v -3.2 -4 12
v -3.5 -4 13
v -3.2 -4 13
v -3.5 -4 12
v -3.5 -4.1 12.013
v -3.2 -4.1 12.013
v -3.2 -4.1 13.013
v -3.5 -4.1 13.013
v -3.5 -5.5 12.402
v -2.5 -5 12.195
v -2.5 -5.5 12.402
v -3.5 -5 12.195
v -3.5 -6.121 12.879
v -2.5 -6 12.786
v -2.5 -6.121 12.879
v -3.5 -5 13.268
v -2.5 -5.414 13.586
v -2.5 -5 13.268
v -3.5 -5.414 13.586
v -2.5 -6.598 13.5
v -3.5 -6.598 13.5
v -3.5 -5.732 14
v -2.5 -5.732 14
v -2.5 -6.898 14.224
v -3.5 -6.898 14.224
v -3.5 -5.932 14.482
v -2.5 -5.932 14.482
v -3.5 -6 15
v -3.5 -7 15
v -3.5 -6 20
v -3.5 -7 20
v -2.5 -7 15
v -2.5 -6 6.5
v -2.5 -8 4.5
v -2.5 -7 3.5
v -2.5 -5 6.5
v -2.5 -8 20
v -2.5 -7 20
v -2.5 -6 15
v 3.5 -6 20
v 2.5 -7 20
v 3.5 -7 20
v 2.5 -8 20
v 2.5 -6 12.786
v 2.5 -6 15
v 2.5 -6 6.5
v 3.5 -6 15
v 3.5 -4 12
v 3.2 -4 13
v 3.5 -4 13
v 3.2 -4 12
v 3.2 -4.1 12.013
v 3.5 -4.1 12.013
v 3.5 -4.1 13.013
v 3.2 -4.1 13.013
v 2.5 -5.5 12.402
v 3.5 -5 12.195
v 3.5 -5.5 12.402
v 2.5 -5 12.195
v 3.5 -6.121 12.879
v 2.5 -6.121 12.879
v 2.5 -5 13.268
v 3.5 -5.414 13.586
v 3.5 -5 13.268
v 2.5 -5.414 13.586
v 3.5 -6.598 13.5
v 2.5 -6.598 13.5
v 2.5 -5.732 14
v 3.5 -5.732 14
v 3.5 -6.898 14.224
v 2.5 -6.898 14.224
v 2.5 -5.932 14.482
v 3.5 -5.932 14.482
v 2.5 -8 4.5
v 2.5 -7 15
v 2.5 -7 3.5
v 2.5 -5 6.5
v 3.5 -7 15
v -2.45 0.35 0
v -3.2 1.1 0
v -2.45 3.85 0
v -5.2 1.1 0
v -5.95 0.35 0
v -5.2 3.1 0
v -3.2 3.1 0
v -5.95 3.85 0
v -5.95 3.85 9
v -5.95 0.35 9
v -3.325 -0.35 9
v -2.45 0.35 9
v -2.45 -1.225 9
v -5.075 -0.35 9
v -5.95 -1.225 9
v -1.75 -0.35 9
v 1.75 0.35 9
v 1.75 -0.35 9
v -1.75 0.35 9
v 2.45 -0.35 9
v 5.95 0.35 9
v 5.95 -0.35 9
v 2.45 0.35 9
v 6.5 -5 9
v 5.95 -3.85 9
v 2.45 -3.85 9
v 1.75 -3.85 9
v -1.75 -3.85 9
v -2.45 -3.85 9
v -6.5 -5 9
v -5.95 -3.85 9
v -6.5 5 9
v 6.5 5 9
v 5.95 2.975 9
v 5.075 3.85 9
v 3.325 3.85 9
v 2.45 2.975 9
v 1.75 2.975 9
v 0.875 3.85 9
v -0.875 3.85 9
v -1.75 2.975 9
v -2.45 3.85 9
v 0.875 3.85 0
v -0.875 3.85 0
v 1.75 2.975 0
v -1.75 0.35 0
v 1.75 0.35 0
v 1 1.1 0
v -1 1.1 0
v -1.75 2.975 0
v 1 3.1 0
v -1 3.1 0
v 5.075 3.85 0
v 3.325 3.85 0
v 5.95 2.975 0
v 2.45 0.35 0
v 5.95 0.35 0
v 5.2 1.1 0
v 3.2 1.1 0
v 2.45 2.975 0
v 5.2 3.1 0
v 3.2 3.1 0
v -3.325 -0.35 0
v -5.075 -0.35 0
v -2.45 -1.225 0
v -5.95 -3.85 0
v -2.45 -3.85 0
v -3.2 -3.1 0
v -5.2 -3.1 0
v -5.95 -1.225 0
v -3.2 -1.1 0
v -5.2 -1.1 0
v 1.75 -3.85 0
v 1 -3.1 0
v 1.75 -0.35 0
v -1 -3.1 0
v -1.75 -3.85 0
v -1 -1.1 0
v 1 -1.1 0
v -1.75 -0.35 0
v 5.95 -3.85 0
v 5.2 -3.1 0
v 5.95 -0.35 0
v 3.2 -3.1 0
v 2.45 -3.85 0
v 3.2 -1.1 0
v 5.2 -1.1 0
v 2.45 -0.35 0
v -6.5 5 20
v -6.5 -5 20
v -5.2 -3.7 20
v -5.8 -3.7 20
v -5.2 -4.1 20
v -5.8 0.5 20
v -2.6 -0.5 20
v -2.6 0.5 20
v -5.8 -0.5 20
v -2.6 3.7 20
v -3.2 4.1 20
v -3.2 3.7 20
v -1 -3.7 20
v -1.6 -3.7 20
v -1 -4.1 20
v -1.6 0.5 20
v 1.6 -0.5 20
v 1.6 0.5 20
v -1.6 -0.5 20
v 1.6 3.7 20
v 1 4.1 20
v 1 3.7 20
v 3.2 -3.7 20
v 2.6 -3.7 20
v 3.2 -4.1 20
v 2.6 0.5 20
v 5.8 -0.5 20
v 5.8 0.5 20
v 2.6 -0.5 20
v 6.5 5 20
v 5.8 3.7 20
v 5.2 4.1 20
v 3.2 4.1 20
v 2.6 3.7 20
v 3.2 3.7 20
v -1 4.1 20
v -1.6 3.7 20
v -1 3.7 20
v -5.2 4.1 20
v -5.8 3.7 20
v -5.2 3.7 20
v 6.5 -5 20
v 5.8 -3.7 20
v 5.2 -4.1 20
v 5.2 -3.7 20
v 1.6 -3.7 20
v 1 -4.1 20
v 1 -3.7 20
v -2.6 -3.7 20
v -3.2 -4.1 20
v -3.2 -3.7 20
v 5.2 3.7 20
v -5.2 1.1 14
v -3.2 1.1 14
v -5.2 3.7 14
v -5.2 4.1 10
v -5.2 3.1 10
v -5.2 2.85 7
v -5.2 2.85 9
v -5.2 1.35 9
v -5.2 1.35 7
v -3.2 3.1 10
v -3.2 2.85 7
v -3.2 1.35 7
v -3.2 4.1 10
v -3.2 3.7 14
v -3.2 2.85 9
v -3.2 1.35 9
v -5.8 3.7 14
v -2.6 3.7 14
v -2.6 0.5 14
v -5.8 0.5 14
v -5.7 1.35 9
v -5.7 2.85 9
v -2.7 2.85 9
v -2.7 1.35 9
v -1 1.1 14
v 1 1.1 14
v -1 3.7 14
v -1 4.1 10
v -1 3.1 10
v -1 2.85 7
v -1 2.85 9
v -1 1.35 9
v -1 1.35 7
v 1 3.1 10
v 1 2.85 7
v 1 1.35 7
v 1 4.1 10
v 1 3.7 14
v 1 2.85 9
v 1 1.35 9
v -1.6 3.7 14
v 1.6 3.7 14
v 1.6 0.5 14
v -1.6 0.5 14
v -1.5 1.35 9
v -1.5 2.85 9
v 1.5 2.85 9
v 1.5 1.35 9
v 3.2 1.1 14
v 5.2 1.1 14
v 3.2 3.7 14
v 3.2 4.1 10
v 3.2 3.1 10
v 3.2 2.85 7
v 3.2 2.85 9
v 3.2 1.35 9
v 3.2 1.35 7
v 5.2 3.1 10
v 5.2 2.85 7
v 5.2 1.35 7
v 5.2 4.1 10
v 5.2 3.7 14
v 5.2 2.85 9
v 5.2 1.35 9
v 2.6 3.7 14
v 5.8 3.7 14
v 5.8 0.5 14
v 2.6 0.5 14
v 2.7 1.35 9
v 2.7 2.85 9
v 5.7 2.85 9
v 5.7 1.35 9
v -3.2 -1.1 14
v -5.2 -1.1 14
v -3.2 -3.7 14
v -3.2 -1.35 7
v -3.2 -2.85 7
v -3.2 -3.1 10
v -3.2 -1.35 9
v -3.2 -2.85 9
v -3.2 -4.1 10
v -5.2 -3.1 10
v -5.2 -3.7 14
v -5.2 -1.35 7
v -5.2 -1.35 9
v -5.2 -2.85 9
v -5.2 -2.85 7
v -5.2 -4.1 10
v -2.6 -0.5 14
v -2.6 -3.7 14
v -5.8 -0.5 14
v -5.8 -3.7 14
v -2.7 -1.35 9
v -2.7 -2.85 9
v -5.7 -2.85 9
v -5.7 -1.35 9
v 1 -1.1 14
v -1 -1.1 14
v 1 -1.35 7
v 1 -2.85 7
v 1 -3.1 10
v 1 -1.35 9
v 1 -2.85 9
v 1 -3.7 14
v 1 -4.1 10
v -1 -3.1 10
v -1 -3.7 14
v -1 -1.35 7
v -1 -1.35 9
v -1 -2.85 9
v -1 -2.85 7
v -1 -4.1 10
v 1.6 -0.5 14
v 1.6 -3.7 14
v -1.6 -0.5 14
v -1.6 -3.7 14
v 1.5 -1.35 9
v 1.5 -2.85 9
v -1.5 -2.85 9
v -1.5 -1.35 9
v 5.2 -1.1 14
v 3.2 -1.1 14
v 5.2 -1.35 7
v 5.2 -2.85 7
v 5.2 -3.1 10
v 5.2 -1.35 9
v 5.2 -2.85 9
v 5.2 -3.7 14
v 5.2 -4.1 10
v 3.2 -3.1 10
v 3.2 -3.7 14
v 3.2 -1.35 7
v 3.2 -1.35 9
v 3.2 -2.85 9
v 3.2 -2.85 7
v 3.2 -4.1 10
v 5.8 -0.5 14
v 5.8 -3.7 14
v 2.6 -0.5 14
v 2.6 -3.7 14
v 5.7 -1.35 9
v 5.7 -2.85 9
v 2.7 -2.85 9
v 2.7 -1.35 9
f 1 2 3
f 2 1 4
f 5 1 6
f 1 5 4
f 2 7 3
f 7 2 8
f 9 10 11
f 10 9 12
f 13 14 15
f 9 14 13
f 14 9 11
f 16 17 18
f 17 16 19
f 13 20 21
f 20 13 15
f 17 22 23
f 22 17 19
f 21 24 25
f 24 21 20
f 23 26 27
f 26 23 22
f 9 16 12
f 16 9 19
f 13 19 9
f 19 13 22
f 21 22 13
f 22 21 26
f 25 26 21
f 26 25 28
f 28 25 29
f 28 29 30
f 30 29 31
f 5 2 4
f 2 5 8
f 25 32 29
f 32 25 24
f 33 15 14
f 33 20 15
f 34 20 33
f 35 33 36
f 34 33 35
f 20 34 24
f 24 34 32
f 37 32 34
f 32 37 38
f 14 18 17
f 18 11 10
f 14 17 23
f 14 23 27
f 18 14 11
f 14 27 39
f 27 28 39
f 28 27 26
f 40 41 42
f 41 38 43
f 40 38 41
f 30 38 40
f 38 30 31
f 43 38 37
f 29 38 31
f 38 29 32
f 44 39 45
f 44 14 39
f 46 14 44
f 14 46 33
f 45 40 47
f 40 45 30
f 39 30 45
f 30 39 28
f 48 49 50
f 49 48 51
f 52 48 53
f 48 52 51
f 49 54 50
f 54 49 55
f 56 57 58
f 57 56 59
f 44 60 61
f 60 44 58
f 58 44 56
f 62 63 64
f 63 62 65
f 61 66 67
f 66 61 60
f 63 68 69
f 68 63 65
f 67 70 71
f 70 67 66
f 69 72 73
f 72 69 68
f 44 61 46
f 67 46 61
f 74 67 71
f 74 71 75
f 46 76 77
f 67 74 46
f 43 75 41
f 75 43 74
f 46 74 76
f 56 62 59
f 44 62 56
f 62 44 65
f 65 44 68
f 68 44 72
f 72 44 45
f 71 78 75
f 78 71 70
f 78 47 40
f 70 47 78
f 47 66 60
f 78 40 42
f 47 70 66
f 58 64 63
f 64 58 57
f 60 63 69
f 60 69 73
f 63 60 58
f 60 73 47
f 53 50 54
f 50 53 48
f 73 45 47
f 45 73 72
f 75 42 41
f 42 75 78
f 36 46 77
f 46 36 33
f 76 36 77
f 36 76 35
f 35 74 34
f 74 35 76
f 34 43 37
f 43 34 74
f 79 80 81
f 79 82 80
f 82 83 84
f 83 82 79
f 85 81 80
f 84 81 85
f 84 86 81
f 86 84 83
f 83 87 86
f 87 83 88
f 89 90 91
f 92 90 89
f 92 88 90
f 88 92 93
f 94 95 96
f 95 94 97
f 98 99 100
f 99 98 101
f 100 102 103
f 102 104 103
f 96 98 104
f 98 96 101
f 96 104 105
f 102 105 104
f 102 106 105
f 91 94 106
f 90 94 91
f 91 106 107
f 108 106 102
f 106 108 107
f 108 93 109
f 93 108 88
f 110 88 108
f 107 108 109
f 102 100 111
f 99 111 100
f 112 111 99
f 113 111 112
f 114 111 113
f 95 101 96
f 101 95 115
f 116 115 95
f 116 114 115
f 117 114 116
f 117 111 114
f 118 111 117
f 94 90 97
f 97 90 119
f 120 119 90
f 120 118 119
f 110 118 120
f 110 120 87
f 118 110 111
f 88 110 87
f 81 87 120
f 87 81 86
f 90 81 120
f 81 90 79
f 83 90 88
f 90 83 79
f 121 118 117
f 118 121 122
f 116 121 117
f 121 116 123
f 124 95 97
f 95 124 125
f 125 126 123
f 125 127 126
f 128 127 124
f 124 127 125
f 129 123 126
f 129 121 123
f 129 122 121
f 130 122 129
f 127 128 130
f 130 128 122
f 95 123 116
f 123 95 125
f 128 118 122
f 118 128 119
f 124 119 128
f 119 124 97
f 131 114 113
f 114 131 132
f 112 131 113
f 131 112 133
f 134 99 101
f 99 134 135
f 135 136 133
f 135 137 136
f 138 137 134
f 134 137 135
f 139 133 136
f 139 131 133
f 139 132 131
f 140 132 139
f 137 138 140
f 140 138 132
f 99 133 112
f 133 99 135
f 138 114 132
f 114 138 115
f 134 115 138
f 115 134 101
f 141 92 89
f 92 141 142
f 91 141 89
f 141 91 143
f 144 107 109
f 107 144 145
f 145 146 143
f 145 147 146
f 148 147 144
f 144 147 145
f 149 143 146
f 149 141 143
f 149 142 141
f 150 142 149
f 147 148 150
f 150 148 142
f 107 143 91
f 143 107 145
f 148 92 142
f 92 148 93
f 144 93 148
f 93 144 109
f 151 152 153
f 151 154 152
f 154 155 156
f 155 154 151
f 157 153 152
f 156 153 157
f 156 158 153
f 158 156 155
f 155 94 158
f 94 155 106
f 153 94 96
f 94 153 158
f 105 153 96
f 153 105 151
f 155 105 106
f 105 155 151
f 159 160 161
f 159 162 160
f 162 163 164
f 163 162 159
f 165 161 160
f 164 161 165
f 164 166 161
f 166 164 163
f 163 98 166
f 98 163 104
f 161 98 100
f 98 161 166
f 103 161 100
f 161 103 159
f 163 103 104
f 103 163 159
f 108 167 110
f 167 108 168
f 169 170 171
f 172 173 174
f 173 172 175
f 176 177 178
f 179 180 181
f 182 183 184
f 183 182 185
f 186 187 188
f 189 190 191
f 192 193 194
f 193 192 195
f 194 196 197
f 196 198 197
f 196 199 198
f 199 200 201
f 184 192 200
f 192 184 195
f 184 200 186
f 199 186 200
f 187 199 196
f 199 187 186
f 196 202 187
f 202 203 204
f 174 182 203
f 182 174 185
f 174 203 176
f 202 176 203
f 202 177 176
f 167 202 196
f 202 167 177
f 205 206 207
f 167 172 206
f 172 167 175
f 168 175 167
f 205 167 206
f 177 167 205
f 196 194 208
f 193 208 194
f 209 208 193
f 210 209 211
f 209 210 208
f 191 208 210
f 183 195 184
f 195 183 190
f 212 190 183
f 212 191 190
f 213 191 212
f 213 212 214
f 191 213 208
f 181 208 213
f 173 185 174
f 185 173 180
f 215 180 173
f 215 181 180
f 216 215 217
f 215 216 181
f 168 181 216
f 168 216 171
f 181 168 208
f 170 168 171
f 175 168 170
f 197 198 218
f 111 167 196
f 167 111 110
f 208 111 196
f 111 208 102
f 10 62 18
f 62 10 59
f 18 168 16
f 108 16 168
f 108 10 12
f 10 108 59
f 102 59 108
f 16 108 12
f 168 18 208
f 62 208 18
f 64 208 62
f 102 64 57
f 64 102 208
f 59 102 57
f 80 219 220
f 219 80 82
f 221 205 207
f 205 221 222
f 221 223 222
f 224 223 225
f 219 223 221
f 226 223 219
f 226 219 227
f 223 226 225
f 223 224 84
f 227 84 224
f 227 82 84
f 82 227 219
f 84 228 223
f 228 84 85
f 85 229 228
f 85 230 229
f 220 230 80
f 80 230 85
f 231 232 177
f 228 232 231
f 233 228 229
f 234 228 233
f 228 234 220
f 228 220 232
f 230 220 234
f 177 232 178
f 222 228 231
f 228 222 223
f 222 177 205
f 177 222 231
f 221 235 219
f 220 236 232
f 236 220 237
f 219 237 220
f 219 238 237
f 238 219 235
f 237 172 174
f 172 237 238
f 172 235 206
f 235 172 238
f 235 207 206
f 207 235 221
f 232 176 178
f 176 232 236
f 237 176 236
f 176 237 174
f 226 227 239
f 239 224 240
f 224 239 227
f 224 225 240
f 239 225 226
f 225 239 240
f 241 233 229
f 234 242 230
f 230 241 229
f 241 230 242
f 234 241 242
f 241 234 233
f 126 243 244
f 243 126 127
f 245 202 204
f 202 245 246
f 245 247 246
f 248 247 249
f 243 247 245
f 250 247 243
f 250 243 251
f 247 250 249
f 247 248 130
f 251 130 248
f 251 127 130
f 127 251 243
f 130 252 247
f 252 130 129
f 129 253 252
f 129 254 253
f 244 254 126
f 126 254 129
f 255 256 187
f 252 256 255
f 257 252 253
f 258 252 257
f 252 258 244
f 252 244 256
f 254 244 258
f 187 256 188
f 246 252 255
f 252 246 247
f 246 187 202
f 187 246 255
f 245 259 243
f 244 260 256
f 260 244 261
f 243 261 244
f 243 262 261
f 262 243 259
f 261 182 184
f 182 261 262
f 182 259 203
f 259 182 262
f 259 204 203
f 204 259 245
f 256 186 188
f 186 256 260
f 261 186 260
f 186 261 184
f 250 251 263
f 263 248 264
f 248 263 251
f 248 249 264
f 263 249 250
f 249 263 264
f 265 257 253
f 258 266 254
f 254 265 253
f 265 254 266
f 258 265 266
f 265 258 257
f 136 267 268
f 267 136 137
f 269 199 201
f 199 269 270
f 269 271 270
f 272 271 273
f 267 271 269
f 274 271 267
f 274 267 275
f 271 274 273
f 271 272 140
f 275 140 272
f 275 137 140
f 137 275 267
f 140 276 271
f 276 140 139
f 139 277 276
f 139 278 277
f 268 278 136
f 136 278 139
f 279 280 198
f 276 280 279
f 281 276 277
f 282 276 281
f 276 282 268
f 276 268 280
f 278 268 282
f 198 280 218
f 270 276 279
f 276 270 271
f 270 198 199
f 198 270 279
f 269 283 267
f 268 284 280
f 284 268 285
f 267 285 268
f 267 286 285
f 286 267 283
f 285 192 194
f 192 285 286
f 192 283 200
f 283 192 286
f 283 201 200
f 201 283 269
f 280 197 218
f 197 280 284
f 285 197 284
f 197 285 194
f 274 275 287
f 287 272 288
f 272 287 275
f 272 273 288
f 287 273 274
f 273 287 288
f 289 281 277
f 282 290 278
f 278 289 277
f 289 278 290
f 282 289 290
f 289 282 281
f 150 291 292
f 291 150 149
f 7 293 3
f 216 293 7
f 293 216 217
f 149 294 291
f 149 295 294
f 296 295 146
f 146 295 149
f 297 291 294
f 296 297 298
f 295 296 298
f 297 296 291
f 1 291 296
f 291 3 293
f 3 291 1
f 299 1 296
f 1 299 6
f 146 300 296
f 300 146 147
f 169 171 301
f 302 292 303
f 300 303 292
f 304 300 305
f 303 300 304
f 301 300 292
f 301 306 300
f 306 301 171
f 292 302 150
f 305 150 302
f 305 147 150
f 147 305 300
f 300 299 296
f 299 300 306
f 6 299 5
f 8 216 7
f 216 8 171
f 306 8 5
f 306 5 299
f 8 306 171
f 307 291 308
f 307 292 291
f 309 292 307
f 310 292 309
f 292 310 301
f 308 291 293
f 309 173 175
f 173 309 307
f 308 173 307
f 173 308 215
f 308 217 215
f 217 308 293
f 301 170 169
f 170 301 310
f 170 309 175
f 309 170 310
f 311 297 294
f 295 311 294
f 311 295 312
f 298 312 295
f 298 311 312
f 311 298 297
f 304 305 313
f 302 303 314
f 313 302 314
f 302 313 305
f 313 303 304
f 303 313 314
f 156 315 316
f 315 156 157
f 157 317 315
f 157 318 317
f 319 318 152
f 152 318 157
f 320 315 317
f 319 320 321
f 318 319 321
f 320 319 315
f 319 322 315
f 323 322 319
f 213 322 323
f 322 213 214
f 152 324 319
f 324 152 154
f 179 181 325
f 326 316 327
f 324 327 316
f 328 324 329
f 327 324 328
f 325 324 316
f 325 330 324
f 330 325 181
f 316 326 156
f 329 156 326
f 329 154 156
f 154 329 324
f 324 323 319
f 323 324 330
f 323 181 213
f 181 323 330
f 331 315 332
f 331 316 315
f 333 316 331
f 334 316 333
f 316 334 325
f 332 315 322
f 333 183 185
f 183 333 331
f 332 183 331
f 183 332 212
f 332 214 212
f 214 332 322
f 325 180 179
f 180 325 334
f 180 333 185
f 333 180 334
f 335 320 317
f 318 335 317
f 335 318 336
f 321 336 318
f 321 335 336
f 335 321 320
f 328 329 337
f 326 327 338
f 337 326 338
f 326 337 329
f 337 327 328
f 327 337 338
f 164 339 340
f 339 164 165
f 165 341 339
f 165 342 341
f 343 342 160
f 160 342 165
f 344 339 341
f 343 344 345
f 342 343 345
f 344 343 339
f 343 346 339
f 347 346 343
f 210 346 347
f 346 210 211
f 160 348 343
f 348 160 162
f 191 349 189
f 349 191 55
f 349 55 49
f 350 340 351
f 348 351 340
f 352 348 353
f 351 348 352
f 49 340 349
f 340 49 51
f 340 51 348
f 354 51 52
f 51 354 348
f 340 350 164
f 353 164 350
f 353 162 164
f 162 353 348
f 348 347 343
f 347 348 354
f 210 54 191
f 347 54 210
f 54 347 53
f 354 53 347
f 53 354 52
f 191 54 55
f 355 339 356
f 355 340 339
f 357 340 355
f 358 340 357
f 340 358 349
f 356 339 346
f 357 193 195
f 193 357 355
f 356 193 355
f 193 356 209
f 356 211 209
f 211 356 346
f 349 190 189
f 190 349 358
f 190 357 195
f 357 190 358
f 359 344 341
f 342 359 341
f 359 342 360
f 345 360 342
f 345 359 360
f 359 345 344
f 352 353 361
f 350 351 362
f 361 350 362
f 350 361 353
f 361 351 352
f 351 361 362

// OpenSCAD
$fn = 25;

pin_d = 2;
pin_w = 2;
pin_h = 20;

pin_top_d=3;
pin_top_w=2;
pin_top_h=pin_h-10;


pin_top2_d=3.2;
pin_top2_w=3.2;
pin_top2_h=pin_h-14;

p_pos_h=7;

dis = 4.2;

pins = [
  [-1, .5, 0],
  [0, .5, 1],
  [1, .5, 1],
  [-1, -.5, 1],
  [0, -.5, 0],
  [1, -.5, 0]
];

module p() {
  translate(
    [
    0,
    0,
    2
    ]
  )  
  rotate(
    [
    0,
    90,
    0
    ]  
  )
  translate(
    [
    0,
    0,
    -1.5/2
    ]
  )
  linear_extrude(
    height=1.5
  )
  polygon(
    [
    [0, 0],
    [0, 0.5],
    [2, 0]
    ]
  );
}

module pin() {
  linear_extrude(height=pin_h)
  square([pin_d, pin_w], center=true);
 
  translate(
    [
      (pin_top_d-pin_d)/2,
      0,
      pin_h-pin_top_h
    ]
  )
  linear_extrude(height=pin_top_h)
  square([pin_top_d, pin_top_w], center=true);
    
  translate(
    [
      0,
      0,
      pin_h-pin_top2_h
    ]
  )
  linear_extrude(height=pin_top2_h)
  square([pin_top2_d, pin_top2_w], center=true);
    translate(
    [
    0,
    pin_d/2,
    p_pos_h
    ]
    )
    p();
    
    rotate(
    [
    0,
    0,
    180
    ]
    )
    translate(
    [
    0,
    pin_d/2,
    p_pos_h
    ]
    )
    p();
}

module pin_bottom_body_cut() {
    linear_extrude(height=9)
    polygon(
    [
    [-1.75, -1.75],
    [1.75, -1.75],
    [1.75, 1.75/2],
    [1.75/2, 1.75],
    [-1.75/2, 1.75],
    [-1.75, 1.75/2]
    ]
    );
}

module pin_bottom_body_rec() {
    linear_extrude(height=9)
    square(
    [3.5, 3.5], center=true
    );
}

module body() {
    translate(
    [
    0,
    0,
    9
    ]
    )
    linear_extrude(height=11)
    square([13, 10], center=true);
}


module clip() {
   translate(
    [
    0,
    0,
    9
    ]
    )
   rotate(
    [
    -90,
    0,
    0
    ]
    )
   translate(
    [
    0,
    0,
    -2.5
    ]
    )
   linear_extrude(height=5)
   union() {
       square([2, 15], center=true);
       translate(
        [
        0, 5
        ]
       )
       polygon(
       [
        [-1, 0],
        [1, 0],
        [1, 1],
        [2, 1],
        [0, 4],
        [-1, 3]
       ] 
       );
   }
   
   translate(
   [
   3,
   0,
   11.5
   ]
   )
   rotate(
   [
   0,
   90,
   90
   ]
   )
   both_flex();
}

module flex() {
   translate([
    0,
    0,
    -0.5
    ]) {
   rotate_extrude(angle=90)
   translate([2, 0])
   square([1, 1]);
   
   linear_extrude(height=1)
   translate([
   -5,
   2 
   ])
   square([5, 1]);
   }
}

module both_flex() {
   translate(
    [
    0,
    0,
    3
    ]
    )
   flex();
   translate(
    [
    0,
    0,
    -3
    ]
    )
   flex();
}


translate(
[
00,
-7,
3.5
]
)
rotate(
[
0,
0,
90
]
)
clip();


difference() {
    union() {
        body();
        for( pin = pins ) {
          translate(
          [
            dis*pin.x,
            dis*pin.y,
            0
          ]
          )
          if (pin.z==0) {
            pin_bottom_body_rec();
          } else {
            pin_bottom_body_cut();
          }
        }
    };

    for( pin = pins ) {
      translate(
      [
        dis*pin.x,
        dis*pin.y,
        0
      ]
      )
      rotate(
      [
      0,
      0,
      180*pin.y  
      ]  
      )
      pin();
    }
}
